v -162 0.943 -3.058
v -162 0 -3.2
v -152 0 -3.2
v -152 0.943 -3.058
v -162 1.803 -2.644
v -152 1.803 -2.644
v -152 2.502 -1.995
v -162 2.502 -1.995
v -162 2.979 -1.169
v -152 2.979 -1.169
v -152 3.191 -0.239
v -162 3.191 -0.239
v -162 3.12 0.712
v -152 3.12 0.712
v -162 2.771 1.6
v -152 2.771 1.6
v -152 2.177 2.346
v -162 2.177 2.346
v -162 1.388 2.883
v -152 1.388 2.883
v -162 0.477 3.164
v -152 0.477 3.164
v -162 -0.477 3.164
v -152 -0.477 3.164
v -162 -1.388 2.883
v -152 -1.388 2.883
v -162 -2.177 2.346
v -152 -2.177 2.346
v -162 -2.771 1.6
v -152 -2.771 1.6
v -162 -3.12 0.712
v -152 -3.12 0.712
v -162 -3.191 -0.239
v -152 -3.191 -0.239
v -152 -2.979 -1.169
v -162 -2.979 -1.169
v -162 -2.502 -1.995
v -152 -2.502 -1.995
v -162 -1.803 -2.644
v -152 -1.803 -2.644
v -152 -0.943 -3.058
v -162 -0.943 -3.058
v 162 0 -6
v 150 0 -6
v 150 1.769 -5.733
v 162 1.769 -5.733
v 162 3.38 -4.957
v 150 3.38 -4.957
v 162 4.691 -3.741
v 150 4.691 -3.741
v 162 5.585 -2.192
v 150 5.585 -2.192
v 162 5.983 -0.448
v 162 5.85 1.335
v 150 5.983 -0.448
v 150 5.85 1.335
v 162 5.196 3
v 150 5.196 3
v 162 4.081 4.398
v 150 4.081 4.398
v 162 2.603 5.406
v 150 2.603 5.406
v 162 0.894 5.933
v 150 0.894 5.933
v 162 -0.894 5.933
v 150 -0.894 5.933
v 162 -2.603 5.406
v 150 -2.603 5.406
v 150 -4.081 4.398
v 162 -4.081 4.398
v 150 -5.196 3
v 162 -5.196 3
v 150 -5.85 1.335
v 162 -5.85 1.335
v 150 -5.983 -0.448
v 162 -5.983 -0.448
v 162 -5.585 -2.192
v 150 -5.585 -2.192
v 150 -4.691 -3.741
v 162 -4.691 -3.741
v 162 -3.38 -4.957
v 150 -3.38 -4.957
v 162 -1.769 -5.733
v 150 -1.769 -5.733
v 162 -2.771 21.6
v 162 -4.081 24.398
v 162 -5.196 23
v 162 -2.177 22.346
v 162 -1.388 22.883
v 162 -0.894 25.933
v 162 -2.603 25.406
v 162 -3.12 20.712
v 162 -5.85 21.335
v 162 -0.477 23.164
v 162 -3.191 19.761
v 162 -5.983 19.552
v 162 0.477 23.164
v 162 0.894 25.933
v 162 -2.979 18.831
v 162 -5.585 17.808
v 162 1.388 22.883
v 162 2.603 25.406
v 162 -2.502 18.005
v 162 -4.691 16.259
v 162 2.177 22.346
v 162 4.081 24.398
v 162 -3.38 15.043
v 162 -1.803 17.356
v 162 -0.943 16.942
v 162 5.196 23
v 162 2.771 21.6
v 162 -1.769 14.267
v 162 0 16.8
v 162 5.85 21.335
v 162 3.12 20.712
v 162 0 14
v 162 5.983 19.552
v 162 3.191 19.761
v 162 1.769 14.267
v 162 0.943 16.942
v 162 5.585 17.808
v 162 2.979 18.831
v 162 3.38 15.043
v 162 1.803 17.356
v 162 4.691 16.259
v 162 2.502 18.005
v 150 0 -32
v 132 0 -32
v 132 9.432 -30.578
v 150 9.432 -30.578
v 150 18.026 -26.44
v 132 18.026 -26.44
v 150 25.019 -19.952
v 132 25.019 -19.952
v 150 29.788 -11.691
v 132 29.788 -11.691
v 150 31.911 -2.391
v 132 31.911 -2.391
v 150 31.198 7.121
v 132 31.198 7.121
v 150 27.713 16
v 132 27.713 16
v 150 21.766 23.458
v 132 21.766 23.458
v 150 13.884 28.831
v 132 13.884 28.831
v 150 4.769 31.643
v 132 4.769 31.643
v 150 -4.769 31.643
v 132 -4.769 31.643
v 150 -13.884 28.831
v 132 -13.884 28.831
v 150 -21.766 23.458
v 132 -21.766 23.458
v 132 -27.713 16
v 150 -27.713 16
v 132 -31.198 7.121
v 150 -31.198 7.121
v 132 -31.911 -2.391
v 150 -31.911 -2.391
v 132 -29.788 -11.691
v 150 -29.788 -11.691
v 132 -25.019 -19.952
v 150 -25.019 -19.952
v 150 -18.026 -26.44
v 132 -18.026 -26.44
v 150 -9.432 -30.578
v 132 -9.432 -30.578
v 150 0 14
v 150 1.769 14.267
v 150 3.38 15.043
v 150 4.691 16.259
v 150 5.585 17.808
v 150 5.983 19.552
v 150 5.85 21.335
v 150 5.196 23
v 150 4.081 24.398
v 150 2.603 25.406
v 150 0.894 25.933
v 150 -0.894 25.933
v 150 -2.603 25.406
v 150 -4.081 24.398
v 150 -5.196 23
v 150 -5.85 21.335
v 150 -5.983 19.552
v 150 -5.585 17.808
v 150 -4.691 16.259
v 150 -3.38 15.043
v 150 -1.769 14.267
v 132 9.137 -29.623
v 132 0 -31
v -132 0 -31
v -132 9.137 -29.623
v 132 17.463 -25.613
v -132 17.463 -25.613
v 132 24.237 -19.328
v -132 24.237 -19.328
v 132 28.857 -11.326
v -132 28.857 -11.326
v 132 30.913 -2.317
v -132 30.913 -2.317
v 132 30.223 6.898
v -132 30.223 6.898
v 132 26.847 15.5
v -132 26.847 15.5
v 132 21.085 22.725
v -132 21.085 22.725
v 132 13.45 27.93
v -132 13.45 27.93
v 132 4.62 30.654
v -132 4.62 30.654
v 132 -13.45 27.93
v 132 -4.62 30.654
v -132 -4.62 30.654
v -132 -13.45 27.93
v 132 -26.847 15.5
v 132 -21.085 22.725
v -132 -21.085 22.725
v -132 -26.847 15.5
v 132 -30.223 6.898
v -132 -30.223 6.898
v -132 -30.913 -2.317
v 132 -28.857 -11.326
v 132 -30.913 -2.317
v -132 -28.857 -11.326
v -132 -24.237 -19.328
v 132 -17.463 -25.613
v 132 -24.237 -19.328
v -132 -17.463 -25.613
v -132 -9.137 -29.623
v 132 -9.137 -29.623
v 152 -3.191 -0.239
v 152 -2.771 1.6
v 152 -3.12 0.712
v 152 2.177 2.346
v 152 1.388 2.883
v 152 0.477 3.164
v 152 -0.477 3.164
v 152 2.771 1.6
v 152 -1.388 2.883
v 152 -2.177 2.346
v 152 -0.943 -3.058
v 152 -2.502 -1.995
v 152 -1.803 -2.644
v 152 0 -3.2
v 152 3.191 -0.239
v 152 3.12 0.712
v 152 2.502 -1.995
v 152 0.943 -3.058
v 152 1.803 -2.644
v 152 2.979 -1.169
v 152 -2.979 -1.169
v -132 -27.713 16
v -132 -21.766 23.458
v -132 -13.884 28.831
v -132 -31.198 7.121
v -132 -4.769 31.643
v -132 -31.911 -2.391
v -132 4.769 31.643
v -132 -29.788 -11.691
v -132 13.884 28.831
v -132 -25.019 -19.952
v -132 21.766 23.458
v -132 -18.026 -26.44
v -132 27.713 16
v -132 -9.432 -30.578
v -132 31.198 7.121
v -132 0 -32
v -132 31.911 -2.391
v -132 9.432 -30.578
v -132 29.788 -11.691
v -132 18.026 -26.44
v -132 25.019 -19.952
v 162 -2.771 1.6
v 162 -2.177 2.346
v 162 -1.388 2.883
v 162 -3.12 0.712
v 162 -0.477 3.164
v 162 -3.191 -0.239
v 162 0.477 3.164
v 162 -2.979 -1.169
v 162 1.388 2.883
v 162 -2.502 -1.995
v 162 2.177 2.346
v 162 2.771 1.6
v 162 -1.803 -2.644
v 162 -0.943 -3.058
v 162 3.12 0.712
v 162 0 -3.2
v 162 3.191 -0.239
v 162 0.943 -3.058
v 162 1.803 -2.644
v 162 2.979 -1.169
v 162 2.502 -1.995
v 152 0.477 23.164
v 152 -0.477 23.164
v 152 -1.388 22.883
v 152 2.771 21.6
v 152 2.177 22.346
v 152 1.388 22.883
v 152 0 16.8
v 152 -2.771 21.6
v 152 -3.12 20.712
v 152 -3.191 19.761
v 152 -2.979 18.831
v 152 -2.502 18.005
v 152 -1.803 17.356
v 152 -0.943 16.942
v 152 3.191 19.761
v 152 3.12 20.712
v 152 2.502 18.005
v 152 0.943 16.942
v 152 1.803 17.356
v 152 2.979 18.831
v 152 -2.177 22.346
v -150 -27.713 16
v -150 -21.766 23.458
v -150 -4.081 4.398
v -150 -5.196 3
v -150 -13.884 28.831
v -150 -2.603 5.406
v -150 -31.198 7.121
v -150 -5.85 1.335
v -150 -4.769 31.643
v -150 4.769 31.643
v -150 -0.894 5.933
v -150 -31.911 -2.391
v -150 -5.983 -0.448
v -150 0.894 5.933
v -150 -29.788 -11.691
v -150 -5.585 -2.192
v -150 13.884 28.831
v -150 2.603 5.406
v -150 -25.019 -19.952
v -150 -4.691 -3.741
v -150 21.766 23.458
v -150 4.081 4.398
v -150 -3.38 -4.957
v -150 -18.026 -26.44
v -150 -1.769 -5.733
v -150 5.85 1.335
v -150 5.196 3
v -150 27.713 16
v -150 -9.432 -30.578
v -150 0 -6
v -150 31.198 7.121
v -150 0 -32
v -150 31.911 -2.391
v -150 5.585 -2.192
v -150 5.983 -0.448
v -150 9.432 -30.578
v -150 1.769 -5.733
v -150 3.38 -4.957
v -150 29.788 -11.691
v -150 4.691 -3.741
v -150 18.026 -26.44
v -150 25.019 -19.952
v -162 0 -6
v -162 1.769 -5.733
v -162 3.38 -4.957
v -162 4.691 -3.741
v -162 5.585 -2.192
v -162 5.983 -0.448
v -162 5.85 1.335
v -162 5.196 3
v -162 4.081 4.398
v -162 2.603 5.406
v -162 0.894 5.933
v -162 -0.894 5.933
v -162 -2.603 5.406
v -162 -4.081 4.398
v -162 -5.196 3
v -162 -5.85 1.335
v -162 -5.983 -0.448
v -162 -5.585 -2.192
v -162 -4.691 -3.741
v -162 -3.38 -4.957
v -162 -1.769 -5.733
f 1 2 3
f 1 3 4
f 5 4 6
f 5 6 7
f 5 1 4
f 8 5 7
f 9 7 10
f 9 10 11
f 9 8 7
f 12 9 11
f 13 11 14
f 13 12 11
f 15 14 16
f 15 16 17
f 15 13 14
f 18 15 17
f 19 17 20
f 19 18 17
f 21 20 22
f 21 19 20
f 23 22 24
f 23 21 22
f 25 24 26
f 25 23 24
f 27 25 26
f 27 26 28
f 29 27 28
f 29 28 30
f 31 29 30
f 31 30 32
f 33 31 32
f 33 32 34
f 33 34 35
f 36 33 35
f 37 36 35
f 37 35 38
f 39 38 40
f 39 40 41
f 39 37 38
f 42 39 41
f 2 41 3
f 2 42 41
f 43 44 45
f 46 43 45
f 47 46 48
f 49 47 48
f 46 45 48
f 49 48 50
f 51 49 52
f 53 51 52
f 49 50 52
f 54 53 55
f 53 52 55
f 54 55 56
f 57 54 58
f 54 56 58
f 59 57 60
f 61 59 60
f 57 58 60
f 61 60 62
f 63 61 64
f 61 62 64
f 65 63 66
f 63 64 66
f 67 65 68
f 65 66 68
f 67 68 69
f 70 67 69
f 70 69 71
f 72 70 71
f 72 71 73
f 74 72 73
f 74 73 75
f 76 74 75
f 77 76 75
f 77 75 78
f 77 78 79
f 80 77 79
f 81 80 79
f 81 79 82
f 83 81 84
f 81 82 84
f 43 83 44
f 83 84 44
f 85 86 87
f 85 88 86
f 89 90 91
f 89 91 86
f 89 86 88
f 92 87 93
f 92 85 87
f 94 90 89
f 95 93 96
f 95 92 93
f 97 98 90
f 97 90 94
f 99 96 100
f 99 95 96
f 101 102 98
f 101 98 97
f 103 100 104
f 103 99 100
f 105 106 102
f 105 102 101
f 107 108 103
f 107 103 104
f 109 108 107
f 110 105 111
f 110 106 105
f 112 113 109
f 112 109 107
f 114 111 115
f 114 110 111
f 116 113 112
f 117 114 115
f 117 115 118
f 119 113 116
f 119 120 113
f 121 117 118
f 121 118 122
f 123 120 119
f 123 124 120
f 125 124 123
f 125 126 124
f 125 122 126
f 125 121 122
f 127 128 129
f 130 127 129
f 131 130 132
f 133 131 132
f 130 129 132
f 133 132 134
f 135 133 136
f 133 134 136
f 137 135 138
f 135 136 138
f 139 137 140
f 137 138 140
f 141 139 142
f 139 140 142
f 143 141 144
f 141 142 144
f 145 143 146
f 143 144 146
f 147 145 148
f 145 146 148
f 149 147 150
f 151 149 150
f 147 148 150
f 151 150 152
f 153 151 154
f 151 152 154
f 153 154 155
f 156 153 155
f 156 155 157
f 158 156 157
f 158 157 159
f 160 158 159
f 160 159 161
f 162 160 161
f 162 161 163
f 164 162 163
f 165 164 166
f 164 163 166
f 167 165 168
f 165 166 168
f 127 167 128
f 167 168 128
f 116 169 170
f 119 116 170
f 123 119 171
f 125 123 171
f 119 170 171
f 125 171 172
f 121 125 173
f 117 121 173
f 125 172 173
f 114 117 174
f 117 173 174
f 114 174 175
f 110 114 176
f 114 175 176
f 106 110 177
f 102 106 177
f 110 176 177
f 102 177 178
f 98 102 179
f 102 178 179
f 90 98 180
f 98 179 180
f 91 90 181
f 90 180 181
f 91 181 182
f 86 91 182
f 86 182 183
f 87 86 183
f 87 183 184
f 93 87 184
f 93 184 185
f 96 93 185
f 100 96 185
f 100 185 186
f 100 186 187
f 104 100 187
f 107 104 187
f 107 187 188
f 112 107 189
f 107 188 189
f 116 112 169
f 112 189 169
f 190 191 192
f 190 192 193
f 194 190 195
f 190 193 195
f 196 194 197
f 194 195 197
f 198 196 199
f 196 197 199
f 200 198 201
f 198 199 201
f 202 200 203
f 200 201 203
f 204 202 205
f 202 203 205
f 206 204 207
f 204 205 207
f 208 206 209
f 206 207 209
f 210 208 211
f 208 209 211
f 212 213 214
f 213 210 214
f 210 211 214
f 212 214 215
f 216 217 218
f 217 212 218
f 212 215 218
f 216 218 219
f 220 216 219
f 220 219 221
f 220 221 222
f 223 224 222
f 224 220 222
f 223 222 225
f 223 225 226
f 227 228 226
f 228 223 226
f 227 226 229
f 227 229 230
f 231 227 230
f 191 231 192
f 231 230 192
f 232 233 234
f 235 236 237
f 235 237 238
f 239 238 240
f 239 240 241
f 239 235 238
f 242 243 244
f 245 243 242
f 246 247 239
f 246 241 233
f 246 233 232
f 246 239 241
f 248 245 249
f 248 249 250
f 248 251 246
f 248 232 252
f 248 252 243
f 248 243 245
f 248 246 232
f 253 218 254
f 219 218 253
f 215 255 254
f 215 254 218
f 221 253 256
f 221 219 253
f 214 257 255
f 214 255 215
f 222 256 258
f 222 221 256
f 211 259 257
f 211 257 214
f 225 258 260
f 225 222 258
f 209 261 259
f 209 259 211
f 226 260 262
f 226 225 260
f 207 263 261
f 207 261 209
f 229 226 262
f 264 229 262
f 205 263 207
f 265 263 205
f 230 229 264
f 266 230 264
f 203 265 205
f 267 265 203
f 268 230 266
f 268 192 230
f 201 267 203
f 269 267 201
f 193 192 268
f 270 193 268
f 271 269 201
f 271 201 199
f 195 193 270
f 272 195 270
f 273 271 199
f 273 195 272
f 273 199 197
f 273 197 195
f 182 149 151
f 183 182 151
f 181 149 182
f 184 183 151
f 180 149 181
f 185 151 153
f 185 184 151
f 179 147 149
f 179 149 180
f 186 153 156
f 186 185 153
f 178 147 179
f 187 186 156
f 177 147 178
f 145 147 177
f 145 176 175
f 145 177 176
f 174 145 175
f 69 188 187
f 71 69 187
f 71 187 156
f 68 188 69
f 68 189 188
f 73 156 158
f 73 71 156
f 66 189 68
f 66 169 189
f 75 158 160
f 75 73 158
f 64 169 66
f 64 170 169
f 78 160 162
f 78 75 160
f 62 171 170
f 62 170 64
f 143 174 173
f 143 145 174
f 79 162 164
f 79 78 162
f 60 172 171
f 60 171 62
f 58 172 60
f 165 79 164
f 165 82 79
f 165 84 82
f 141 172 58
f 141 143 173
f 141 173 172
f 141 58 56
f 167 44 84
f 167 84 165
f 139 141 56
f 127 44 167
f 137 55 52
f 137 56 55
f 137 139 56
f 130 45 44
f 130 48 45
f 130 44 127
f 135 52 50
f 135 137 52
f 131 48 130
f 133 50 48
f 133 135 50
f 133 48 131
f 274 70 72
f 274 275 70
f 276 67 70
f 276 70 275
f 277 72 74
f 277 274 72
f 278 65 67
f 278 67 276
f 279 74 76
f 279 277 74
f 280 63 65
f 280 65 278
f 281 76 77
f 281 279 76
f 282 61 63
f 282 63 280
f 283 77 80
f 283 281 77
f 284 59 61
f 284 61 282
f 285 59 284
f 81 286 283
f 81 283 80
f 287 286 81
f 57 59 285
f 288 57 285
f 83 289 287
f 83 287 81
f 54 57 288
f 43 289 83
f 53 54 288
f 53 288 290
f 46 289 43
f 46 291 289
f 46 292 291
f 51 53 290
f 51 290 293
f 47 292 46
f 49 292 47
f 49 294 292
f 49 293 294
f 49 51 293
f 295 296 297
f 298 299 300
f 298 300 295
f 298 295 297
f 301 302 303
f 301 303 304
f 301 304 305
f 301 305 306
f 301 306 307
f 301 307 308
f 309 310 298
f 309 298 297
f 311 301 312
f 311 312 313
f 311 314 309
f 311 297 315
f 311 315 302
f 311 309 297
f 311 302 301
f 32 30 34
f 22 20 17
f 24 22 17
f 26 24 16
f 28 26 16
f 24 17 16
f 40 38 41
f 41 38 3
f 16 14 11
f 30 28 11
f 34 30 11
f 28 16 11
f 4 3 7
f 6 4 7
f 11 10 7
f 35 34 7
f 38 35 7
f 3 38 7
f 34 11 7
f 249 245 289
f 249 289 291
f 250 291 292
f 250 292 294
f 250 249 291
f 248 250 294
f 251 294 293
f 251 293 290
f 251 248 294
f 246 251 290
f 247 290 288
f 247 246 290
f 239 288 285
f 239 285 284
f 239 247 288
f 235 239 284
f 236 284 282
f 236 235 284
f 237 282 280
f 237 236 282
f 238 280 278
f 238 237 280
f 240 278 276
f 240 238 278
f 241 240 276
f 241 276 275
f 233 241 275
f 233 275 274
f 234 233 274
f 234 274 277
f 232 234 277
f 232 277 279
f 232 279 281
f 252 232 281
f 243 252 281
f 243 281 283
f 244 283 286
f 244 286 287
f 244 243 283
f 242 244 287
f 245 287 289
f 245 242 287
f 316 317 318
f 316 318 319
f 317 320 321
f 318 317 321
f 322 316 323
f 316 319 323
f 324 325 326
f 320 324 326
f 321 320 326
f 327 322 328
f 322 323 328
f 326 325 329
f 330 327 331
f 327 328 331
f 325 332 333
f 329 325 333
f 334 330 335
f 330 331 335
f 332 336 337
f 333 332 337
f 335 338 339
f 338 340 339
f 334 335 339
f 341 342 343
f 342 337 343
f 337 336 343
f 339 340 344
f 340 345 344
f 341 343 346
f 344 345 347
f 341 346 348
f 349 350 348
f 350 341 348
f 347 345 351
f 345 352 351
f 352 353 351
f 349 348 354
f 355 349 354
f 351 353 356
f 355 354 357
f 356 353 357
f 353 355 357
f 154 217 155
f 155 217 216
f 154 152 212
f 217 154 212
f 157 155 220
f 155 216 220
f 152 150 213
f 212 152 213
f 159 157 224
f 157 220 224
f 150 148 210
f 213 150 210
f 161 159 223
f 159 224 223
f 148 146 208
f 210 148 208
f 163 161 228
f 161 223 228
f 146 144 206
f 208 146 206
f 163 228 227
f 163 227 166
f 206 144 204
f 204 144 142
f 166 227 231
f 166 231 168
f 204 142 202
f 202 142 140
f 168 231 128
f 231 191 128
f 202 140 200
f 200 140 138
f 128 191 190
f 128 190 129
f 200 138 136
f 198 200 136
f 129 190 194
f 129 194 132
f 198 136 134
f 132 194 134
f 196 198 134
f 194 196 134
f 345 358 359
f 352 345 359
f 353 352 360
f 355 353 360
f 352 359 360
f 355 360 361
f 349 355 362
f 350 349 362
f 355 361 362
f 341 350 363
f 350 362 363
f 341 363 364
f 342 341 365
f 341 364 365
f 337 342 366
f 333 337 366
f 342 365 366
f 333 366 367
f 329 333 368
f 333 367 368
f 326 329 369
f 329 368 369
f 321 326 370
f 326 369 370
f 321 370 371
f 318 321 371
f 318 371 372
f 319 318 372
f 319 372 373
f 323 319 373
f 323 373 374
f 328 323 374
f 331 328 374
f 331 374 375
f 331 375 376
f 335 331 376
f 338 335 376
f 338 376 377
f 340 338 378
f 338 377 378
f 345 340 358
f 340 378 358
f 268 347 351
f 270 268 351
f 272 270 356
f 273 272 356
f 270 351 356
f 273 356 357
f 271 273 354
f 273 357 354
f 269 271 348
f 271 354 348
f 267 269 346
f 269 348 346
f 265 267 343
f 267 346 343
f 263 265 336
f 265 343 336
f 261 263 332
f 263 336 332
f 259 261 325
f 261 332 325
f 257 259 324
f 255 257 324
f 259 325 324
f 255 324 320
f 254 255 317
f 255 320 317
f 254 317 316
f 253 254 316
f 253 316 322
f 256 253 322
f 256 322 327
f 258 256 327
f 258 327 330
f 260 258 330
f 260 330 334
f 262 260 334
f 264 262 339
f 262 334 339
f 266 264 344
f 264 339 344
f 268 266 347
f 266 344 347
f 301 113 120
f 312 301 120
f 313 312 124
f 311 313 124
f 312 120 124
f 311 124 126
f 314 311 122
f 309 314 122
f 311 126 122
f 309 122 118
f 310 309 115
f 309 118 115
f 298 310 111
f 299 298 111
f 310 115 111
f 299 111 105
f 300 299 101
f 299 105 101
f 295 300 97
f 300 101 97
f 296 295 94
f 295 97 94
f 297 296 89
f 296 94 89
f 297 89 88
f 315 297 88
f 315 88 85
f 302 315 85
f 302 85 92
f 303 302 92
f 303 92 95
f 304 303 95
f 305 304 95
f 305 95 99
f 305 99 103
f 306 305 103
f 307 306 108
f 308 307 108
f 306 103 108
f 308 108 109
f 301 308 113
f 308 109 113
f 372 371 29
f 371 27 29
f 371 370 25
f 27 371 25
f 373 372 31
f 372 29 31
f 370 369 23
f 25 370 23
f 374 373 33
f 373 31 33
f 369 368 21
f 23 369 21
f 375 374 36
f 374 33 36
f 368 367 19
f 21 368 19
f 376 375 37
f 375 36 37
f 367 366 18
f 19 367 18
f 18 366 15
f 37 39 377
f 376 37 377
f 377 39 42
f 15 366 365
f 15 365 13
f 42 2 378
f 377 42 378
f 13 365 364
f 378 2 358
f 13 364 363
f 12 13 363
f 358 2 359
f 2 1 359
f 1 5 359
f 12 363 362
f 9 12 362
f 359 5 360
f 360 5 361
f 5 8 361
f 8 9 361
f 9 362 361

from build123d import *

# Parameters (mm, degrees)
BODY_START          = -150
SKETCH1_R           = 31
BODY_DEPTH          = 300
END_CAP_IN_START    = -150
SKETCH2_R           = 32
END_CAP_IN_DEPTH    = 18
END_CAP_OUT_START   = 132
SKETCH3_R           = 32
END_CAP_OUT_DEPTH   = 18
INLET_PORT_START    = -162
SKETCH4_R           = 6
INLET_PORT_DEPTH    = 12
INLET_SOCKET_START  = -162
SKETCH5_R           = 3.2
INLET_SOCKET_DEPTH  = 10
OUTLET_PORT_START   = 150
SKETCH6_R           = 6
OUTLET_PORT_DEPTH   = 12
OUTLET_SOCKET_START = 152
SKETCH7_R           = 3.2
OUTLET_SOCKET_DEPTH = 10
REJECT_PORT_START   = 150
SKETCH8_R           = 6
REJECT_PORT_DEPTH   = 12
REJECT_SOCKET_START = 162
SKETCH9_R           = 3.2
REJECT_SOCKET_DEPTH = 10


with BuildPart() as part:
    # Sketch1 → Body (new body)
    with BuildSketch(Plane(origin=(0, 0, 0), x_dir=(0, 0, -1), z_dir=(1, 0, 0)).offset(BODY_START)):
        Circle(SKETCH1_R)
    extrude(amount=BODY_DEPTH)

    # Sketch2 → End_Cap_In (add)
    with BuildSketch(Plane(origin=(0, 0, 0), x_dir=(0, 0, -1), z_dir=(1, 0, 0)).offset(END_CAP_IN_START)):
        Circle(SKETCH2_R)
    extrude(amount=END_CAP_IN_DEPTH)

    # Sketch3 → End_Cap_Out (add)
    with BuildSketch(Plane(origin=(0, 0, 0), x_dir=(0, 0, -1), z_dir=(1, 0, 0)).offset(END_CAP_OUT_START)):
        Circle(SKETCH3_R)
    extrude(amount=END_CAP_OUT_DEPTH)

    # Sketch4 → Inlet_Port (add)
    with BuildSketch(Plane(origin=(0, 0, 0), x_dir=(0, 0, -1), z_dir=(1, 0, 0)).offset(INLET_PORT_START)):
        Circle(SKETCH4_R)
    extrude(amount=INLET_PORT_DEPTH)

    # Sketch5 → Inlet_Socket (cut)
    with BuildSketch(Plane(origin=(0, 0, 0), x_dir=(0, 0, -1), z_dir=(1, 0, 0)).offset(INLET_SOCKET_START)):
        Circle(SKETCH5_R)
    extrude(amount=INLET_SOCKET_DEPTH, mode=Mode.SUBTRACT)

    # Sketch6 → Outlet_Port (add)
    with BuildSketch(Plane(origin=(0, 0, 0), x_dir=(0, 0, -1), z_dir=(1, 0, 0)).offset(OUTLET_PORT_START)):
        Circle(SKETCH6_R)
    extrude(amount=OUTLET_PORT_DEPTH)

    # Sketch7 → Outlet_Socket (cut)
    with BuildSketch(Plane(origin=(0, 0, 0), x_dir=(0, 0, -1), z_dir=(1, 0, 0)).offset(OUTLET_SOCKET_START)):
        Circle(SKETCH7_R)
    extrude(amount=OUTLET_SOCKET_DEPTH, mode=Mode.SUBTRACT)

    # Sketch8 → Reject_Port (add)
    with BuildSketch(Plane(origin=(0, 0, 0), x_dir=(0, 0, -1), z_dir=(1, 0, 0)).offset(REJECT_PORT_START)):
        with Locations((-20, 0)):
            Circle(SKETCH8_R)
    extrude(amount=REJECT_PORT_DEPTH)

    # Sketch9 → Reject_Socket (cut)
    with BuildSketch(Plane(origin=(0, 0, 0), x_dir=(0, 0, -1), z_dir=(1, 0, 0)).offset(REJECT_SOCKET_START)):
        with Locations((-20, 0)):
            Circle(SKETCH9_R)
    extrude(amount=-REJECT_SOCKET_DEPTH, mode=Mode.SUBTRACT)


solid = part.part
